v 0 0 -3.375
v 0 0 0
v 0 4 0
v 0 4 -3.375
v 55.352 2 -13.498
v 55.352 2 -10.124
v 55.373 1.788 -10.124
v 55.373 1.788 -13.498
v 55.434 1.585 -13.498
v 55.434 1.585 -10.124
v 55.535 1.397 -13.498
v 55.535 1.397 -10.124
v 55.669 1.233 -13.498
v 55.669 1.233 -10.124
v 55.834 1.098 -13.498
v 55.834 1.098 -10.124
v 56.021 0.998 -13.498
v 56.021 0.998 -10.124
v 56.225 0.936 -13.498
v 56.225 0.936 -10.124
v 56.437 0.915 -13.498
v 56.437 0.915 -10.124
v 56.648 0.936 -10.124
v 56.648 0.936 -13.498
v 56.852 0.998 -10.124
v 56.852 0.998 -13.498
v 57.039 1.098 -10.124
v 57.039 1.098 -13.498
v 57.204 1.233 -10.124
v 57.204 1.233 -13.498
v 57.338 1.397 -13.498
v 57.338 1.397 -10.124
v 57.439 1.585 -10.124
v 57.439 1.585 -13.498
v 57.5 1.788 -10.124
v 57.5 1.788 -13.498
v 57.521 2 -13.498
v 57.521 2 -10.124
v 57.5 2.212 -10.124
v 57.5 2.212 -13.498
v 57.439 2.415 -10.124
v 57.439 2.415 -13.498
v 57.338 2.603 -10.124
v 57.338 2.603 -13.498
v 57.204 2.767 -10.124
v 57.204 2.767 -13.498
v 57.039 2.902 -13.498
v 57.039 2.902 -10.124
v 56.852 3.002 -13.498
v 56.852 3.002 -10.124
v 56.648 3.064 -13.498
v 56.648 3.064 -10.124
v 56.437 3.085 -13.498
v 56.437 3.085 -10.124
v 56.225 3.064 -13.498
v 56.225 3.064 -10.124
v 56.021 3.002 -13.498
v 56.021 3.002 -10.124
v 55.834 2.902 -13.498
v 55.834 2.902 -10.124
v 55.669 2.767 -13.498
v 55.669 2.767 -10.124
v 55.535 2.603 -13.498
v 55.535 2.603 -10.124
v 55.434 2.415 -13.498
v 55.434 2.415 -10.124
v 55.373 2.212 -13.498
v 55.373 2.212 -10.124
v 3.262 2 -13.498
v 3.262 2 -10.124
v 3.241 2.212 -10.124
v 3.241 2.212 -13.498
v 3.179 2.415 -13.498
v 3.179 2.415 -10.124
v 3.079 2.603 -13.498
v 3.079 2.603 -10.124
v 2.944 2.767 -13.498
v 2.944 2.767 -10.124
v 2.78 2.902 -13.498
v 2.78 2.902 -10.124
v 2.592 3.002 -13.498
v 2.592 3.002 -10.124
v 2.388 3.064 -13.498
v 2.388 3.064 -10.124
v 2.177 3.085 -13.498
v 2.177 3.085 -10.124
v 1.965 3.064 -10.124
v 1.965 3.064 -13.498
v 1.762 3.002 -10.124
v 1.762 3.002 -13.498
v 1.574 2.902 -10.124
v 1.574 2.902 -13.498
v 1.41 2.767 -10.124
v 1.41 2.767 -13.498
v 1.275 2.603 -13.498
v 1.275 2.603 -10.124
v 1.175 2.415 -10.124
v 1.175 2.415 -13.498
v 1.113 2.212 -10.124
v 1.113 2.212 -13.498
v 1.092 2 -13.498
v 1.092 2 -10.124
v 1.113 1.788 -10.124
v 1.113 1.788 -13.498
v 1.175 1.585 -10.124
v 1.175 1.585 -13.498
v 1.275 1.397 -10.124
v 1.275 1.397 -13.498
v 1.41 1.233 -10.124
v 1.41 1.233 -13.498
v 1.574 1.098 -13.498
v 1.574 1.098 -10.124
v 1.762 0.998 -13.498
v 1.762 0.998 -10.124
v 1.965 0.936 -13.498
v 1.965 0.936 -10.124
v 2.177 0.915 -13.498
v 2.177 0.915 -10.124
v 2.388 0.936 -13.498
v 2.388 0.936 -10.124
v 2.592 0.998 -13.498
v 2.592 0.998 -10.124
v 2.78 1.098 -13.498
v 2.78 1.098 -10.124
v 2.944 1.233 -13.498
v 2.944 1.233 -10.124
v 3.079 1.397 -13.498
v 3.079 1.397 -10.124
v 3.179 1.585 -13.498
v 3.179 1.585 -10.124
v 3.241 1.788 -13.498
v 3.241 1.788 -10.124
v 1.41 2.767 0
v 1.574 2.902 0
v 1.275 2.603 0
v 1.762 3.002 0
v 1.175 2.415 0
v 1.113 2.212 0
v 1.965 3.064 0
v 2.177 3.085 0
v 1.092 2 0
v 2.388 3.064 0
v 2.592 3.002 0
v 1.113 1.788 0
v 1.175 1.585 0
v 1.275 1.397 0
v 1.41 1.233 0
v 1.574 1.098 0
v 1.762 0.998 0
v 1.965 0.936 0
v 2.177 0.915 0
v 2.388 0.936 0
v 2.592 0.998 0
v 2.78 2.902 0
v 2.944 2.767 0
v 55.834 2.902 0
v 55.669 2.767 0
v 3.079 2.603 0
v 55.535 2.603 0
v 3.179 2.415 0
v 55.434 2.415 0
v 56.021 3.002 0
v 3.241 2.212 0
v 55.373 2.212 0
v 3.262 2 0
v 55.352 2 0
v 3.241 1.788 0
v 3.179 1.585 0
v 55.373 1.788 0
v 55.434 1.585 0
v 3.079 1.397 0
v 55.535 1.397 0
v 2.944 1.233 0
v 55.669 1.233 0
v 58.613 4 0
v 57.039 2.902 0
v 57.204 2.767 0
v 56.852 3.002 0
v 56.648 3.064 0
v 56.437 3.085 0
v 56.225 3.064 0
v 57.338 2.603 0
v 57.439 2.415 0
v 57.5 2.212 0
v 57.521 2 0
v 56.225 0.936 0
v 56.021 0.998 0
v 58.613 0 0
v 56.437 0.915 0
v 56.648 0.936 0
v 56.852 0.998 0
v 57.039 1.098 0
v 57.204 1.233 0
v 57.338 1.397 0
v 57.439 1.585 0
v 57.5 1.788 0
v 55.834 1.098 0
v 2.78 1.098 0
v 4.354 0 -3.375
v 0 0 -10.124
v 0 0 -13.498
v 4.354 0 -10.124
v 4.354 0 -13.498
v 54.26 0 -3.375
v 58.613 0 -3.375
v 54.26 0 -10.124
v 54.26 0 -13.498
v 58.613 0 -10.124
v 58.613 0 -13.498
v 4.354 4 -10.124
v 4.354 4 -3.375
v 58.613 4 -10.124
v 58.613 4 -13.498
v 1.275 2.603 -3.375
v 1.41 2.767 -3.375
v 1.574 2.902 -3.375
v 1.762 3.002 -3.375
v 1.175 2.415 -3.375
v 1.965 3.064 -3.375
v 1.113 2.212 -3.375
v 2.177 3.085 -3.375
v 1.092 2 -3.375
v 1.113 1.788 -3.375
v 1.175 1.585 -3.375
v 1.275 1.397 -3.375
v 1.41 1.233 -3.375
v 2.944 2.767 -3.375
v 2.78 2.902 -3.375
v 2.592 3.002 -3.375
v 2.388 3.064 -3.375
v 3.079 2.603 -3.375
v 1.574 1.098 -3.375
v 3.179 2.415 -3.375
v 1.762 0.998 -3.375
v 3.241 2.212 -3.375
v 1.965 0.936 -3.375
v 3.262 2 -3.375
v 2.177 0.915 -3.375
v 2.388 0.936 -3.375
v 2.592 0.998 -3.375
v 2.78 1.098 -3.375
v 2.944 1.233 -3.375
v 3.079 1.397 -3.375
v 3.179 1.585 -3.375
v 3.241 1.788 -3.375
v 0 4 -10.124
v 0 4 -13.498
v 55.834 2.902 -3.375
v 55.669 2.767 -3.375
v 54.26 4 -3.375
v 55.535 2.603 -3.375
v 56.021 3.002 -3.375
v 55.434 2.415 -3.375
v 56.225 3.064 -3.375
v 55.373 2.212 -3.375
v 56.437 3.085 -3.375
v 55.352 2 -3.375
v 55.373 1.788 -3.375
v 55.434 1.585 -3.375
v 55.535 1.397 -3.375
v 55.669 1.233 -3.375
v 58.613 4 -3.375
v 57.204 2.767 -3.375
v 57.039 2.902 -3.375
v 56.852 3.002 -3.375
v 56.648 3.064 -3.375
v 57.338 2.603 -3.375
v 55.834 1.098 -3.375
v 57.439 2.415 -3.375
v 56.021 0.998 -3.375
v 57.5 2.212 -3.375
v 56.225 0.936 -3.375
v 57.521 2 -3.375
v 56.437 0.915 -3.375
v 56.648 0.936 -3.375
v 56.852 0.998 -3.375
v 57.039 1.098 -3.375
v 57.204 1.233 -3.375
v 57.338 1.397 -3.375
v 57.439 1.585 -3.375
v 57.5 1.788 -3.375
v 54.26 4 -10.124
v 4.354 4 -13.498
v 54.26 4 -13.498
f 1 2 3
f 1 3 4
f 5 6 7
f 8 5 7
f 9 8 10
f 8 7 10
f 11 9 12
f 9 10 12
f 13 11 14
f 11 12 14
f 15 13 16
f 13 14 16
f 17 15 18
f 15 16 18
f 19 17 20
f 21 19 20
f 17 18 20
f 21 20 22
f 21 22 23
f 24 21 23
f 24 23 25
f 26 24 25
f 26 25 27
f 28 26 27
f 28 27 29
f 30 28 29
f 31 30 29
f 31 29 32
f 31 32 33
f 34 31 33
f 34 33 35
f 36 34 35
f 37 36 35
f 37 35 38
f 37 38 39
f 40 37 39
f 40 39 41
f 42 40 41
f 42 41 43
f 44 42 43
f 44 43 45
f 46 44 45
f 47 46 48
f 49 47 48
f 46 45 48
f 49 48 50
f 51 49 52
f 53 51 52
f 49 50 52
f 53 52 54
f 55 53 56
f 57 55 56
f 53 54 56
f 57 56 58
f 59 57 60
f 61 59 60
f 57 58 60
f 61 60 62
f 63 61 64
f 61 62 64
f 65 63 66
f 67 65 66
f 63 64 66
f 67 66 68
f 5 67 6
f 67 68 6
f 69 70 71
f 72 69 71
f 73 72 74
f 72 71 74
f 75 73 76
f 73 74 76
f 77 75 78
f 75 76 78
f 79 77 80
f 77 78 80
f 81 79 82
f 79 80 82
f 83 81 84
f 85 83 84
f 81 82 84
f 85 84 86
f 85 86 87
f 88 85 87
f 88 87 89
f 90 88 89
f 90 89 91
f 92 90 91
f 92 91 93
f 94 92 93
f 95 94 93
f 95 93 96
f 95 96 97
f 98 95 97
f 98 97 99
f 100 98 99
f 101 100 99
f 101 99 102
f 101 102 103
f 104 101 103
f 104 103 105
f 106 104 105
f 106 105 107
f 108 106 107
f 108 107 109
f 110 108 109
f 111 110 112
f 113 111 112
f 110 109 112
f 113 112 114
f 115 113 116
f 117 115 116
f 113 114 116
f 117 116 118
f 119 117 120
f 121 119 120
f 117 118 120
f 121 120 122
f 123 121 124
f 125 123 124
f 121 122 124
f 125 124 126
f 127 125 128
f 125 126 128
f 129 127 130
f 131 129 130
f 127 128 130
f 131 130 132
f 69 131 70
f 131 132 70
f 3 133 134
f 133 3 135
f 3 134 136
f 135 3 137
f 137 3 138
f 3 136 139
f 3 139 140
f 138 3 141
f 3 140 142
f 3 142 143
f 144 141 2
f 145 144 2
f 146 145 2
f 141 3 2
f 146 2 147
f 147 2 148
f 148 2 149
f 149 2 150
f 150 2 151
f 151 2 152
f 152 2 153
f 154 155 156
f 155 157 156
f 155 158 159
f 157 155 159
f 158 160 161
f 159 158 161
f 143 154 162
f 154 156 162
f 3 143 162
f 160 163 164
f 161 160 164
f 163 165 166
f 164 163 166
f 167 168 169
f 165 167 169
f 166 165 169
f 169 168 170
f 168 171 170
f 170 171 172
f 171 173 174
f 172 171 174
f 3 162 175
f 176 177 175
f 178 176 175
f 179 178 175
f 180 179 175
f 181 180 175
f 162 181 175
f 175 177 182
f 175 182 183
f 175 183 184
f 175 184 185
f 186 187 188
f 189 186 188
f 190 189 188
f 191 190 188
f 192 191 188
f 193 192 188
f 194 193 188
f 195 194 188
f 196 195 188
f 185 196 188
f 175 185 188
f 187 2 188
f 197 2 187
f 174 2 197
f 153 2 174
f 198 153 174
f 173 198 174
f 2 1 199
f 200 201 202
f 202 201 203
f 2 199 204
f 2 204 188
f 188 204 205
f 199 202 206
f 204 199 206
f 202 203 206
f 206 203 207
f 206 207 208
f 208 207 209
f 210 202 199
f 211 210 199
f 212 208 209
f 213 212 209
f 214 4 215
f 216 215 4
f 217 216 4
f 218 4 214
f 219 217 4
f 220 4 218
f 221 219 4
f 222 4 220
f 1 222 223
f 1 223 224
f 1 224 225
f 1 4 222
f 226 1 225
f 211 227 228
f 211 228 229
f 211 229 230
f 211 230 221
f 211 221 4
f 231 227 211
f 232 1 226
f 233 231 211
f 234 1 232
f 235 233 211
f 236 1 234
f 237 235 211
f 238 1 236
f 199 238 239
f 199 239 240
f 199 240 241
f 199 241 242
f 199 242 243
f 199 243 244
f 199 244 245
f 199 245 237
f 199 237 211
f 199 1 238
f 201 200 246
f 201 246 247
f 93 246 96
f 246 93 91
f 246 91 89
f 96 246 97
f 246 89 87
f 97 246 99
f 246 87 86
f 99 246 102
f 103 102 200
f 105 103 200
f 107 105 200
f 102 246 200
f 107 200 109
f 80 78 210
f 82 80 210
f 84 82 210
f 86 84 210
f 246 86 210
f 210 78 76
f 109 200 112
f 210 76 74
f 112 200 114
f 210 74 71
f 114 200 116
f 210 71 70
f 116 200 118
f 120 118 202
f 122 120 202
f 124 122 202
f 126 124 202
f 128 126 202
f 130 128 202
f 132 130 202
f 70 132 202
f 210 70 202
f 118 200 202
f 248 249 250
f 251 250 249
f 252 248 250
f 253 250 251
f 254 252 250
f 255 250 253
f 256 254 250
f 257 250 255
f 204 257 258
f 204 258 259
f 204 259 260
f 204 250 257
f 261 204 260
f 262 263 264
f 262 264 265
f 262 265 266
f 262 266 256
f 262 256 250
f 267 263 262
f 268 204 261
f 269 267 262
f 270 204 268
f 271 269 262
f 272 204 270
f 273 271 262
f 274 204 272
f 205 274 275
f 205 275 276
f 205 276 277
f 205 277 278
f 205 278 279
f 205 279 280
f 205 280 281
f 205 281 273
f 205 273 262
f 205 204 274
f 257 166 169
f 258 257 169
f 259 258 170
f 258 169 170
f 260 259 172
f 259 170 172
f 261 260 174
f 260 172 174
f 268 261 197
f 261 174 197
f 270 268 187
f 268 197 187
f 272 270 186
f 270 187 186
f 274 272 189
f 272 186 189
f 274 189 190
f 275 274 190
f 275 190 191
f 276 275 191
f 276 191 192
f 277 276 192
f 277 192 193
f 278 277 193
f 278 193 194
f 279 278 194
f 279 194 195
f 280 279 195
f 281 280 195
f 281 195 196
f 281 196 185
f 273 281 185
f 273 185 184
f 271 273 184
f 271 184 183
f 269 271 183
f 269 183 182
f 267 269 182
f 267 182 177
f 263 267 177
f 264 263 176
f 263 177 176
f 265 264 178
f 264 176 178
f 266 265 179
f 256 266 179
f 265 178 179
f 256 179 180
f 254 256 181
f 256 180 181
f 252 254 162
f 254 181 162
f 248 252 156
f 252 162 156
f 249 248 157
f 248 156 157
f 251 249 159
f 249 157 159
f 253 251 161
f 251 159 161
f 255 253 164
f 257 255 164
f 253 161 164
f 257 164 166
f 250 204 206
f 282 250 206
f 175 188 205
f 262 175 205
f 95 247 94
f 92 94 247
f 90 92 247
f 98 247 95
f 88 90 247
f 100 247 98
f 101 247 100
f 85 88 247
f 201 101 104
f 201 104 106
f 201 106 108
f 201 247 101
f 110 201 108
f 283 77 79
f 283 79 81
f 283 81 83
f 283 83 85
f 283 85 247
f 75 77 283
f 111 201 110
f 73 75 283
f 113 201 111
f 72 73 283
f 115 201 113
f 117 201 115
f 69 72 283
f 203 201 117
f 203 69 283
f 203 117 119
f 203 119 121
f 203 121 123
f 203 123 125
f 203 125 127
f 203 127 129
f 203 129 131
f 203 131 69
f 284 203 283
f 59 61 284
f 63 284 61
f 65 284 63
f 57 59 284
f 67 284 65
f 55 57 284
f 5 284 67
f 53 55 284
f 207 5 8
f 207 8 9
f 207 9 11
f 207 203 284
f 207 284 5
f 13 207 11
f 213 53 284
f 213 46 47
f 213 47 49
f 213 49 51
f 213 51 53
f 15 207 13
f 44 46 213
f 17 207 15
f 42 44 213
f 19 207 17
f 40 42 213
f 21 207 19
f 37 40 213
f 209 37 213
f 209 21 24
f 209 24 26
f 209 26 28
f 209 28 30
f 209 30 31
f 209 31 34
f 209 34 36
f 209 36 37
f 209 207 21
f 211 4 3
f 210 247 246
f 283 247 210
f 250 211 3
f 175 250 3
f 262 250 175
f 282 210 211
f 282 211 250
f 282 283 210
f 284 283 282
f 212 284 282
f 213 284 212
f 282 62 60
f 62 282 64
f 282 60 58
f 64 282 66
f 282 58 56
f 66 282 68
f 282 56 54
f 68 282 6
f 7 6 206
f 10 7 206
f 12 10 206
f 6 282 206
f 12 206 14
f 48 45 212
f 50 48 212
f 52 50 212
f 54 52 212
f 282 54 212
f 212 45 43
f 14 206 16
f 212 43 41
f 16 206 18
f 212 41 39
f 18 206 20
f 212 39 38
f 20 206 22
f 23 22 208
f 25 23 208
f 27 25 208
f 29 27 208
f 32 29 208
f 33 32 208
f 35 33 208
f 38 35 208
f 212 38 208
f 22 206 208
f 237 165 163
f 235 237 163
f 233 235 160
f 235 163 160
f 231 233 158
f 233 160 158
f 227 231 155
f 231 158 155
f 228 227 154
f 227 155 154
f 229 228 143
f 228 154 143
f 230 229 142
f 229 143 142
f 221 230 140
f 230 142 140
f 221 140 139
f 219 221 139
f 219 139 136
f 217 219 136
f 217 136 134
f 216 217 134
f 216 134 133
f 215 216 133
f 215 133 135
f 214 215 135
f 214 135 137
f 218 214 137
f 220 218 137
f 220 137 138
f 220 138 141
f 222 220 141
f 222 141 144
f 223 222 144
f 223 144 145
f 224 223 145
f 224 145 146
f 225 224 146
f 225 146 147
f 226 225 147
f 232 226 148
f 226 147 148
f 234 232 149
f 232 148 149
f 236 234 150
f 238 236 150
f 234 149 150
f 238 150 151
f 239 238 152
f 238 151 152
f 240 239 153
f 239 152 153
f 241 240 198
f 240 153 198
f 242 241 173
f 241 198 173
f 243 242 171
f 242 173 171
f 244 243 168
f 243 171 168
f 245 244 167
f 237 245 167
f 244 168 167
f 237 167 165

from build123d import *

# Parameters (mm, degrees)
SKETCH1_W           = 4.353701527
SKETCH1_H           = 3.374525205
SKETCH1_H_2         = 3.374525206
SKETCH1_W_2         = 4.353701528
BOSS_EXTRUDE1_DEPTH = 4
SKETCH2_R           = 1.084753974
CUT_EXTRUDE6_DEPTH  = 13.498101


with BuildPart() as part:
    # Sketch1 → Boss-Extrude1 (new body)
    with BuildSketch(Plane(origin=(0, 0, 0), x_dir=(1, 0, 0), z_dir=(0, 1, 0))):
        Polygon((4.353701527, 3.374525206), (4.353701527, 0), (54.259673219, 0), (54.259673219, 3.374525206), (54.259673219, 6.749050412), (54.259673219, 10.123575618), (54.259673219, 13.498100823), (4.353701527, 13.498100823), (4.353701527, 10.123575618), (4.353701527, 6.749050412), align=None)
        with Locations((2.176850764, 11.810838221)):
            Rectangle(SKETCH1_W, SKETCH1_H)
        with Locations((2.176850764, 1.687262603)):
            Rectangle(SKETCH1_W, SKETCH1_H_2)
        with Locations((56.436523983, 11.810838221)):
            Rectangle(SKETCH1_W_2, SKETCH1_H)
        with Locations((56.436523983, 1.687262603)):
            Rectangle(SKETCH1_W_2, SKETCH1_H_2)
    extrude(amount=BOSS_EXTRUDE1_DEPTH)

    # Sketch2 → Cut-Extrude6 (cut)
    with BuildSketch(Plane.XY):
        with Locations((2.176850764, 2)):
            Circle(SKETCH2_R)
        with Locations(Location((56.436523983, 2, 0), (0, 0, 180))):
            Circle(SKETCH2_R)
    extrude(amount=-CUT_EXTRUDE6_DEPTH, mode=Mode.SUBTRACT)


solid = part.part
